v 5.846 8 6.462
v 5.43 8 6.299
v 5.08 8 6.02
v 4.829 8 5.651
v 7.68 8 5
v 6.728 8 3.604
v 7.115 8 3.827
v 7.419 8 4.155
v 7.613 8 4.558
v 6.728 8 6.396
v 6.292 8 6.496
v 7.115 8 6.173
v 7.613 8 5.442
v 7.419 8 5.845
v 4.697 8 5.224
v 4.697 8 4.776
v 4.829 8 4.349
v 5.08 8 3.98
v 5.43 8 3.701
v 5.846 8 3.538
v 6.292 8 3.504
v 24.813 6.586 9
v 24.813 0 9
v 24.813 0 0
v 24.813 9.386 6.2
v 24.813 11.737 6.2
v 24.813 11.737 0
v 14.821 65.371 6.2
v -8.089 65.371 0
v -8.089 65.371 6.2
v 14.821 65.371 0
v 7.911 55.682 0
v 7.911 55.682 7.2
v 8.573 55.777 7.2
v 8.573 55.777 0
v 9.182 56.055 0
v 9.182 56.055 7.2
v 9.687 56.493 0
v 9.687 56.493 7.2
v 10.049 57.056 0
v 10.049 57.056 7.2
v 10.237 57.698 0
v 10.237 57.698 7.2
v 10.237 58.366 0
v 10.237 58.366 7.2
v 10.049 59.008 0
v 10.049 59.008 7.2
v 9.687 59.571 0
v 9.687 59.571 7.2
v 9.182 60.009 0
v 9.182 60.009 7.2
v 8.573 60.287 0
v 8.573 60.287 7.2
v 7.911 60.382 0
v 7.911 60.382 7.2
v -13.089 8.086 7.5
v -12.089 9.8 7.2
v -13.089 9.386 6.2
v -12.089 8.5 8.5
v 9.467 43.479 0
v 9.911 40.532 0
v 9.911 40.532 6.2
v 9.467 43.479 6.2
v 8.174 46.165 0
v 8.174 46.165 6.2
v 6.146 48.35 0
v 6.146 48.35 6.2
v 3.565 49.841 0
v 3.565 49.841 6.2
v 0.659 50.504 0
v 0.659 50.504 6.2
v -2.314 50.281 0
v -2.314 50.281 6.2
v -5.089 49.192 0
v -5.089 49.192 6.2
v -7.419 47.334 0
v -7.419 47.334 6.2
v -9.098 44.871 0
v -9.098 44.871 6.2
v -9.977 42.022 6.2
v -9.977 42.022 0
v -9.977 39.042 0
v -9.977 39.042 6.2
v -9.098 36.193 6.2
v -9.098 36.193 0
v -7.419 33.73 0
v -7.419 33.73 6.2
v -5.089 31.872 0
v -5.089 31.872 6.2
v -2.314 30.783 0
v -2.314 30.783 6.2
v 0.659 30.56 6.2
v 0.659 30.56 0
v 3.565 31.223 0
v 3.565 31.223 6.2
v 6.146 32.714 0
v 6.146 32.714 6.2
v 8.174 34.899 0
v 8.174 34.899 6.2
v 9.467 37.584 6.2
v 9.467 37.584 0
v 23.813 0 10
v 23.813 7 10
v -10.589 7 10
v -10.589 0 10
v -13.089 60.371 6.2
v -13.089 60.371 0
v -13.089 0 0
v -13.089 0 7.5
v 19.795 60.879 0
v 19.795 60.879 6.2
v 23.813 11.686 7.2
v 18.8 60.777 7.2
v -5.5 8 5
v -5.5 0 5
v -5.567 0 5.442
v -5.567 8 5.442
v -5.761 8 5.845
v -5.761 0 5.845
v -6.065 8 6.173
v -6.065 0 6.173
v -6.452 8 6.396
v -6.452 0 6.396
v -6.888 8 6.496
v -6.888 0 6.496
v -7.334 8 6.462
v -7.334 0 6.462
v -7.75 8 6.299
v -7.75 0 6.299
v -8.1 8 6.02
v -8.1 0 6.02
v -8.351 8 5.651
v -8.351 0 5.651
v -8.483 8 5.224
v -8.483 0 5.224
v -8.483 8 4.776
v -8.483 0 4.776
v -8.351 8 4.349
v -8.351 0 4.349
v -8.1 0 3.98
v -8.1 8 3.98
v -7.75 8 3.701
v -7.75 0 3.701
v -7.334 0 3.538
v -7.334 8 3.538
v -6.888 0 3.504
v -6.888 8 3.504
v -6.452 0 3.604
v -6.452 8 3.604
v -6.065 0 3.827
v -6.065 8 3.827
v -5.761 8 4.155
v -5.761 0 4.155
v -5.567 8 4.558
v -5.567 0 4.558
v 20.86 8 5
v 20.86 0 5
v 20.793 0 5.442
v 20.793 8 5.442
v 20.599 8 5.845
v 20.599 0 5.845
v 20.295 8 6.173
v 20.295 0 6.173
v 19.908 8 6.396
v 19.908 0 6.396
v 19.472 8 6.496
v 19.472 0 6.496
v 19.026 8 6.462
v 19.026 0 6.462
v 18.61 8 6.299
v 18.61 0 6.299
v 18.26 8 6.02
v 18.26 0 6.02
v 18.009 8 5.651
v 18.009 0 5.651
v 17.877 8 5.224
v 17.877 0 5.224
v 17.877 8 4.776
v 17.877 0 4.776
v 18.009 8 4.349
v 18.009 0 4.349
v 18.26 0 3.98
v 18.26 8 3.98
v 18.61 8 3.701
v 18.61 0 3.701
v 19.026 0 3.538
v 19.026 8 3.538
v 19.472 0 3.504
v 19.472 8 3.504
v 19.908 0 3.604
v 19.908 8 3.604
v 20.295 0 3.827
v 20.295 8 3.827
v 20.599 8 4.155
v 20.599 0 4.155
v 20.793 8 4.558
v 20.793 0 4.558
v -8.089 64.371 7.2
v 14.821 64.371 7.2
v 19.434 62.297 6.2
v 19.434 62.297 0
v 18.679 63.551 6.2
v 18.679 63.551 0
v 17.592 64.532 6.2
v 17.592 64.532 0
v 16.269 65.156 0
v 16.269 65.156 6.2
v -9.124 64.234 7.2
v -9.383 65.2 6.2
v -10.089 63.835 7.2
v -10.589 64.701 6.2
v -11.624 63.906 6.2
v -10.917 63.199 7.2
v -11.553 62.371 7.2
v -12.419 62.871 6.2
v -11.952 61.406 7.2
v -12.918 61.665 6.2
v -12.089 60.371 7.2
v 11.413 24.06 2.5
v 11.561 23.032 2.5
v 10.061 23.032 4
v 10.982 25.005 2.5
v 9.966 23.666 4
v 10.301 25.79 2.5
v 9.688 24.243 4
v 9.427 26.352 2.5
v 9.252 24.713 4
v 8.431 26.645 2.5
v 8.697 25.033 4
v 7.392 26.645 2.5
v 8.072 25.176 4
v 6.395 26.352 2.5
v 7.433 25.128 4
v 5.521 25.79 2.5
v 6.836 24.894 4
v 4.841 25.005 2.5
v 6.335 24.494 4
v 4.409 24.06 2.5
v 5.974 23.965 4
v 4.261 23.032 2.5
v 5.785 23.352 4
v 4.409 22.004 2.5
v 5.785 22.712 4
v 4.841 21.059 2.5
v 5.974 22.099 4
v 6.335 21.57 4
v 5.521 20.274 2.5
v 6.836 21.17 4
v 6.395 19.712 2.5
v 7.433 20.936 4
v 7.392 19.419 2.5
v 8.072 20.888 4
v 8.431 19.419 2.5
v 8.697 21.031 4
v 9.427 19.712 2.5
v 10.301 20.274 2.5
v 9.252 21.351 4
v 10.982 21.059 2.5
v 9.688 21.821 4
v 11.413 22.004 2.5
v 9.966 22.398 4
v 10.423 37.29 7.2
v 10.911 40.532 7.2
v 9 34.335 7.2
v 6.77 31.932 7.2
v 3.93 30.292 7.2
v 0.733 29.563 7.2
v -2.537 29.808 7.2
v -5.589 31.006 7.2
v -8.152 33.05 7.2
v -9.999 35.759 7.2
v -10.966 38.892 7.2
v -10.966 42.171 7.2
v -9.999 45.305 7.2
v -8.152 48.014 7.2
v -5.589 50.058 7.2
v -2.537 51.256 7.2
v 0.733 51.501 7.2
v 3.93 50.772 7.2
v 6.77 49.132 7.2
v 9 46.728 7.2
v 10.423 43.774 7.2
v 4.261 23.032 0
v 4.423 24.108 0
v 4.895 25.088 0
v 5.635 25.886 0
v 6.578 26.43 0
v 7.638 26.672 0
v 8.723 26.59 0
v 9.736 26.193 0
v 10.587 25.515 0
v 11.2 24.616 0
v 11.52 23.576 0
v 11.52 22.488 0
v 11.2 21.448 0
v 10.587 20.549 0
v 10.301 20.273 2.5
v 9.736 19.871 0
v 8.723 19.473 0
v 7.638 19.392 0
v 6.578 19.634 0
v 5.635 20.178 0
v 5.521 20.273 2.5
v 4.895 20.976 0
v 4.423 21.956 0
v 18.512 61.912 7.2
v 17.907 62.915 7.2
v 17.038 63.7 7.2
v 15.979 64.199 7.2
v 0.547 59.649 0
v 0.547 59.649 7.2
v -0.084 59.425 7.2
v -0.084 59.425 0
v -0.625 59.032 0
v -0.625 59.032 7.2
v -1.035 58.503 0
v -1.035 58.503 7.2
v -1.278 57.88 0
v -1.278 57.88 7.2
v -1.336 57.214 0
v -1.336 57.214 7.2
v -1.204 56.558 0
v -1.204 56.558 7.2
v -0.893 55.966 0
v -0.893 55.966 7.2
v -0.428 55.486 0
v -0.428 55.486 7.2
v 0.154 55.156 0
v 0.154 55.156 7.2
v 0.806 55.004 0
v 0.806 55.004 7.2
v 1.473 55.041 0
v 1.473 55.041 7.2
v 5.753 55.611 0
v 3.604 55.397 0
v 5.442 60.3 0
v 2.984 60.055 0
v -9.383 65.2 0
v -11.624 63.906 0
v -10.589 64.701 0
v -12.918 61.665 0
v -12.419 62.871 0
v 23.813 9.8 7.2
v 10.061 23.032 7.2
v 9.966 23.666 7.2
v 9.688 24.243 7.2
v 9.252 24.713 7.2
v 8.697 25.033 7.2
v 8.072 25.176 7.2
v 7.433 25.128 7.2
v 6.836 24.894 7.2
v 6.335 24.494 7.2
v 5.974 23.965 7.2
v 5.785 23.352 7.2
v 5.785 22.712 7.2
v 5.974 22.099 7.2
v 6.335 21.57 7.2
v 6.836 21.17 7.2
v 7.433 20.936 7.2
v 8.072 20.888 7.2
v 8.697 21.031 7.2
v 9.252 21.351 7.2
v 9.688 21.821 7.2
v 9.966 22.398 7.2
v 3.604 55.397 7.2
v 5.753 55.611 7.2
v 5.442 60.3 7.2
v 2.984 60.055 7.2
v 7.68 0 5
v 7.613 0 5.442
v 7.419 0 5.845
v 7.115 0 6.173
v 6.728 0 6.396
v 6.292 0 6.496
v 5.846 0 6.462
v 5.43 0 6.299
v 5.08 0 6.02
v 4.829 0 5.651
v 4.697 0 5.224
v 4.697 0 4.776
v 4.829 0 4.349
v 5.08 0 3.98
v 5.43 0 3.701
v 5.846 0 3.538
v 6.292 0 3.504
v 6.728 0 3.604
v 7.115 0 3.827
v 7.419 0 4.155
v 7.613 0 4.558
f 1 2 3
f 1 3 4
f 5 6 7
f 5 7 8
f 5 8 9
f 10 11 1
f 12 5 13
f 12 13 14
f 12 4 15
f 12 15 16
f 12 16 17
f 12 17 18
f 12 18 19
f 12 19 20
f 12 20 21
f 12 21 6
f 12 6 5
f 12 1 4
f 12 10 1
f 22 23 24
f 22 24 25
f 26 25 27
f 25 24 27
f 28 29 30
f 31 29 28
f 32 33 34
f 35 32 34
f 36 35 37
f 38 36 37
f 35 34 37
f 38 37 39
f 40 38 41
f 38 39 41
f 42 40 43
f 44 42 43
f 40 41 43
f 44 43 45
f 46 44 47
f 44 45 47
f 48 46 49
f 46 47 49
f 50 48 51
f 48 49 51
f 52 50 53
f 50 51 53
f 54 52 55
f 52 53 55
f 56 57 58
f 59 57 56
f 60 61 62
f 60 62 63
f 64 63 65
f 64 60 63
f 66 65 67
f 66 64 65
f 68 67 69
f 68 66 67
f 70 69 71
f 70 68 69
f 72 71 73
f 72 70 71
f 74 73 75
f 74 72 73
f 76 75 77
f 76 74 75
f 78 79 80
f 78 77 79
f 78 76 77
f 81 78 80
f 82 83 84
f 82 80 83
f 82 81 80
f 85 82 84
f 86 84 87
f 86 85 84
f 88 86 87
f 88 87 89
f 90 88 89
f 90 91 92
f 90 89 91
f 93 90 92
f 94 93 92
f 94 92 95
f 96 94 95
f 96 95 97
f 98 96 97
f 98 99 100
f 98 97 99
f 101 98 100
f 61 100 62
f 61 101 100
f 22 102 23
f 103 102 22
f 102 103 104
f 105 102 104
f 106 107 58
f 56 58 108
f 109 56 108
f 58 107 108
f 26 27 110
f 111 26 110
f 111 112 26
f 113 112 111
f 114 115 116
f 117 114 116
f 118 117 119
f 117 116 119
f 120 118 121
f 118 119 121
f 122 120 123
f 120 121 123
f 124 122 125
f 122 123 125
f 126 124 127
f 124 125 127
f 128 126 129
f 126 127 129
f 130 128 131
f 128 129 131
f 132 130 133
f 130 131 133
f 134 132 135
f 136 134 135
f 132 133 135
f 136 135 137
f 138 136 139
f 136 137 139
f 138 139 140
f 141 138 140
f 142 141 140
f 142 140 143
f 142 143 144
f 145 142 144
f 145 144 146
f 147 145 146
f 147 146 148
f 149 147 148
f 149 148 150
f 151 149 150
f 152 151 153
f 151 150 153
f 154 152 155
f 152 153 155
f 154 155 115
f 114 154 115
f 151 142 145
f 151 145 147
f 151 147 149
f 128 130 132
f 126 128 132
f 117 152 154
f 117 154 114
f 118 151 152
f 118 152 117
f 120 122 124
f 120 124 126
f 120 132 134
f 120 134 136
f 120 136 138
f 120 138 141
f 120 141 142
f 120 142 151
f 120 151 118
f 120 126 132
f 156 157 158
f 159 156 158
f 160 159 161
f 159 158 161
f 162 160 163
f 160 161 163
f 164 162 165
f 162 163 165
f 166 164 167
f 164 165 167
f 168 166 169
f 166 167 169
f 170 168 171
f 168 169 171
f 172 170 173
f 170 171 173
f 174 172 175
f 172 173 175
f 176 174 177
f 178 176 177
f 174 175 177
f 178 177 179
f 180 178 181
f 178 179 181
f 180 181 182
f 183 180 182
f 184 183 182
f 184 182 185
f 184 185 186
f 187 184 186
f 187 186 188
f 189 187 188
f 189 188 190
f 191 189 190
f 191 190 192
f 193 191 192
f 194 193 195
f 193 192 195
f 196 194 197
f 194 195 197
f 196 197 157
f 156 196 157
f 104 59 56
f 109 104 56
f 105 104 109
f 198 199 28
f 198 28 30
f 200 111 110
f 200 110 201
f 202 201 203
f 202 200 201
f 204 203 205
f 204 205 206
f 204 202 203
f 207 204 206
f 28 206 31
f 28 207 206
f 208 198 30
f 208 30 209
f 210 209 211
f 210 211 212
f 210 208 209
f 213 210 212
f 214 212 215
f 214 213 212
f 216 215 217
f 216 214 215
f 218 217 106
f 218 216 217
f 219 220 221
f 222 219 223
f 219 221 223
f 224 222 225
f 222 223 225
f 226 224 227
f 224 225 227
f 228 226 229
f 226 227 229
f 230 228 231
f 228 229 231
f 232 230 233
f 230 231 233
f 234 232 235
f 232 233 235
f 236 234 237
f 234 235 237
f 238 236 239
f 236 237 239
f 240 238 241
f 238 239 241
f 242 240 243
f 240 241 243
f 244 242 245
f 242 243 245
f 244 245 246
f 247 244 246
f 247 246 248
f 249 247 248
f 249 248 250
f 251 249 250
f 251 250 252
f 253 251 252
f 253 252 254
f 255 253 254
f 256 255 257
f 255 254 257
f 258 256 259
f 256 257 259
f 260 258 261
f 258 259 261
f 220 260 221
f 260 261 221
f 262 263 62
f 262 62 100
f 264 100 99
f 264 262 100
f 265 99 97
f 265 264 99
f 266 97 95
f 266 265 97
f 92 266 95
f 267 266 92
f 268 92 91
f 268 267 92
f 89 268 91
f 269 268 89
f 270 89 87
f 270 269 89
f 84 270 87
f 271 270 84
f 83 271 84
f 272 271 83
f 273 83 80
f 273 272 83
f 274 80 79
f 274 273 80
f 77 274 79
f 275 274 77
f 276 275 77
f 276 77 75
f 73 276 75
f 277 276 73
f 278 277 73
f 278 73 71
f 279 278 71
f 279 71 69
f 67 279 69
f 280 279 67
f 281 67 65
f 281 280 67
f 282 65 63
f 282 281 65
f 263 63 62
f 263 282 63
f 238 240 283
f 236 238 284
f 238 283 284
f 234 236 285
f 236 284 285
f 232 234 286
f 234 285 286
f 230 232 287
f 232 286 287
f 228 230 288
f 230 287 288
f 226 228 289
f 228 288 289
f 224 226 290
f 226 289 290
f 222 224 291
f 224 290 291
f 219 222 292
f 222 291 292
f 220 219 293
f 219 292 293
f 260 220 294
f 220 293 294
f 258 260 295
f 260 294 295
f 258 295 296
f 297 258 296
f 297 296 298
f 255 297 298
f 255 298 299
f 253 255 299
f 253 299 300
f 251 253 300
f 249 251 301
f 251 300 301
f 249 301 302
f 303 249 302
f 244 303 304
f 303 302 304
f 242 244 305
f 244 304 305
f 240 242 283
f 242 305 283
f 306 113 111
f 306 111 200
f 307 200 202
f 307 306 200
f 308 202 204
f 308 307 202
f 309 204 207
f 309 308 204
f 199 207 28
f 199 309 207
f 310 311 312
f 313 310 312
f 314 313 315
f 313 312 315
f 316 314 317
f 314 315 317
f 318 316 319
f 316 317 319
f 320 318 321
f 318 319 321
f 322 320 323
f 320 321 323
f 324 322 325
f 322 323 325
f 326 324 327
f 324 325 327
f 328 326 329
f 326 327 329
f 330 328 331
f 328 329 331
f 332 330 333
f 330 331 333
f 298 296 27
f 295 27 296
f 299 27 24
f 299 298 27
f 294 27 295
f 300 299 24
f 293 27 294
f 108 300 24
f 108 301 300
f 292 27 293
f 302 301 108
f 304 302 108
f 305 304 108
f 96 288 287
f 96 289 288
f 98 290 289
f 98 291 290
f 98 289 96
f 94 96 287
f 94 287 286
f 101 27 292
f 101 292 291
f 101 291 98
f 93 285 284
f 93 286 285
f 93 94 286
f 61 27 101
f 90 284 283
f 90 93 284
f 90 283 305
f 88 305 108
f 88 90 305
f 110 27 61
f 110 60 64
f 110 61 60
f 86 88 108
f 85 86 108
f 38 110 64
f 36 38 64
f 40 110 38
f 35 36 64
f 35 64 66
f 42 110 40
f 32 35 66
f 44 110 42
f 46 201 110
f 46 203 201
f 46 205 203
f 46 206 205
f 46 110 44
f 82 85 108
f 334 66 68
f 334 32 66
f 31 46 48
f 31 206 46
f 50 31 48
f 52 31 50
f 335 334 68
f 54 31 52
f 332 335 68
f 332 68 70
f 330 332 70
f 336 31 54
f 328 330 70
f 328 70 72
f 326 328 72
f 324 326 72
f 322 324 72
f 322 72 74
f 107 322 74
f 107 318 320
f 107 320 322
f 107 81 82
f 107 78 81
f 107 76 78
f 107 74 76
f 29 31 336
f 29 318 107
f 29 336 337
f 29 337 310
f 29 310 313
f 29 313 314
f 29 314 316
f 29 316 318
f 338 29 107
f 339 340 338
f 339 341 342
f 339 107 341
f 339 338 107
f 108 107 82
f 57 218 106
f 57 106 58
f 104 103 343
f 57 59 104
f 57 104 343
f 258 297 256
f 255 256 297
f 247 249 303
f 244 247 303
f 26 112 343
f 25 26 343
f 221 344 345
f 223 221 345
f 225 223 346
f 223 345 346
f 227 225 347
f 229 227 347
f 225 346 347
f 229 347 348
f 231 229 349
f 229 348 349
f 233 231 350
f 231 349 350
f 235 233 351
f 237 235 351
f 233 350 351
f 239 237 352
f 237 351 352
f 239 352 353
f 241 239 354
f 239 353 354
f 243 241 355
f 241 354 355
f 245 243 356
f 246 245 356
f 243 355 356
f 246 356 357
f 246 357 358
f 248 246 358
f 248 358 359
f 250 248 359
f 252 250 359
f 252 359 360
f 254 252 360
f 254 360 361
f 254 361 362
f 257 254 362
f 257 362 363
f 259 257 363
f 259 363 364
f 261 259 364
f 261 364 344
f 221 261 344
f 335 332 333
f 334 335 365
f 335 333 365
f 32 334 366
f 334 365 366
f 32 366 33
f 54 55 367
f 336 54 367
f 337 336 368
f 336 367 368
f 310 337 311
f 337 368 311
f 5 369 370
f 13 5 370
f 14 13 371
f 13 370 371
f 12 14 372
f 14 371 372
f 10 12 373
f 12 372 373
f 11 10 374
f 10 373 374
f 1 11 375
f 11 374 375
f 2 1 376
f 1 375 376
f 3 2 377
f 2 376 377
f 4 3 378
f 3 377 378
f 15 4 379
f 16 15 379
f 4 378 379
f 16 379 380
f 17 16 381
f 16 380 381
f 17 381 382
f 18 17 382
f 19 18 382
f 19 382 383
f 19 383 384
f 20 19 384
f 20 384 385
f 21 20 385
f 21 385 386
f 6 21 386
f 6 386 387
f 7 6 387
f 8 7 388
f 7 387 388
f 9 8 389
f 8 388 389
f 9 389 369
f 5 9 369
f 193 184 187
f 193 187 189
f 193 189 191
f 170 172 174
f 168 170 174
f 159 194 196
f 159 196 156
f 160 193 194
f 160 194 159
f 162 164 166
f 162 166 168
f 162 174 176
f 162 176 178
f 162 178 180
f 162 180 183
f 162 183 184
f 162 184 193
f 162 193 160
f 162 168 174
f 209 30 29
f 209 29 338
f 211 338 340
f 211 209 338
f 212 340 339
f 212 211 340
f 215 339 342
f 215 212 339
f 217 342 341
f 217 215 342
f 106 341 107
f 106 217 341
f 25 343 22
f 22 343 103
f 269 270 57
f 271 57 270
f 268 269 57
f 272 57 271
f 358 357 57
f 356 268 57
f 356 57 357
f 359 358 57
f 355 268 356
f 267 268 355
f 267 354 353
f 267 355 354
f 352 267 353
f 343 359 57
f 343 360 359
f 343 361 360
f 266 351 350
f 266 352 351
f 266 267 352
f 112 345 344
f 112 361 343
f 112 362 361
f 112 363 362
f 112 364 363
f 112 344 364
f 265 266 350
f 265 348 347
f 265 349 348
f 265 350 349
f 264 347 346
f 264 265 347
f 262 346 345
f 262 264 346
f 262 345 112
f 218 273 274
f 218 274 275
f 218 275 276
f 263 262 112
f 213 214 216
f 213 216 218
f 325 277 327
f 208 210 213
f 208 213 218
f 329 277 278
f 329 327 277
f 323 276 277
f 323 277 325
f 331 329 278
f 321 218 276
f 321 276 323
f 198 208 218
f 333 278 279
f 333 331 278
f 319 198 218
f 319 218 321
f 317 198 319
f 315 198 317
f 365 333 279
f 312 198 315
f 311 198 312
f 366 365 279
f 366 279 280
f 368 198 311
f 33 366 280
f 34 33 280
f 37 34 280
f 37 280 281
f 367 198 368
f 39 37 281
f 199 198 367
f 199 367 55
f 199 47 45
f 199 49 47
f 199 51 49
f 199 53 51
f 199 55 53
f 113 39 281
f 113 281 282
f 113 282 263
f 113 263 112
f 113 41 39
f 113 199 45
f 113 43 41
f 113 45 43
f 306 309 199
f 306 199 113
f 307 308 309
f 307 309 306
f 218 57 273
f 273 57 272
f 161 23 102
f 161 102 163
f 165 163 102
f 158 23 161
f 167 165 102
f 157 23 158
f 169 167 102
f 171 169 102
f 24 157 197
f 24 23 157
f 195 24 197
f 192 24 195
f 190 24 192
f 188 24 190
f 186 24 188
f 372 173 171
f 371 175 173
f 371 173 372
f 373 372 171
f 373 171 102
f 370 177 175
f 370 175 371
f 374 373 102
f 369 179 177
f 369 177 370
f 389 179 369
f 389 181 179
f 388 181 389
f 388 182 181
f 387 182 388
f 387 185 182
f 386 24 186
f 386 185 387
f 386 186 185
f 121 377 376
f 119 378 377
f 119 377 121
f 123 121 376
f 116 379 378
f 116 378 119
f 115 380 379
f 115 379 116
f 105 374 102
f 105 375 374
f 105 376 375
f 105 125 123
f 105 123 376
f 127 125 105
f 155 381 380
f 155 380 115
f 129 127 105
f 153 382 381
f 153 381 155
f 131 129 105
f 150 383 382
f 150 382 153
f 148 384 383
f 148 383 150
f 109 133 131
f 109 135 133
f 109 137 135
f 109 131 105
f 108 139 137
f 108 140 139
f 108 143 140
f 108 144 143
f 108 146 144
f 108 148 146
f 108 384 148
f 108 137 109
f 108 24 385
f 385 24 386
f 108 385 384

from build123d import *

# Parameters (mm, degrees)
AUFSATZ_LINEAR_AUSTRAGEN1_DEPTH      = 10
SKIZZE2_R                            = 1.5
SCHNITT_LINEAR_AUSTRAGEN1_DEPTH      = 8
SCHNITT_LINEAR_AUSTRAGEN3_DEPTH      = 2.8
SCHNITT_LINEAR_AUSTRAGEN5_DEPTH      = 72.591285383
SCHNITT_LINEAR_AUSTRAGEN5_DEPTH_BACK = 72.591285383
SKIZZE7_R                            = 10
FASE1_SIZE                           = 3
SCHNITT_LINEAR_AUSTRAGEN4_DEPTH      = 10
VERRUNDUNG1_R                        = 5
FASE2_SIZE                           = 1
FASE3_SIZE                           = 2.5
SKIZZE9_R                            = 2.15
SCHNITT_LINEAR_AUSTRAGEN7_DEPTH      = 71.291034025
SKIZZE10_R                           = 3.65
SCHNITT_LINEAR_AUSTRAGEN8_DEPTH      = 2.5
FASE4_SIZE                           = 1.5
SCHNITT_LINEAR_AUSTRAGEN9_DEPTH      = 10


# Some blends are built 0.0001 mm under size
with BuildPart() as part:
    # Skizze1 → Aufsatz-Linear austragen1 (new body)
    with BuildSketch(Plane.XY):
        Polygon((28.287001282, 57.370618027), (28.287001282, 0), (-13.088781156, 0), (-13.088781156, 27.348243657), (-13.088781156, 53.715647777), (-13.088781156, 57.370618027), (-13.088781156, 65.370618027), (28.287001282, 65.370618027), align=None)
    extrude(amount=AUFSATZ_LINEAR_AUSTRAGEN1_DEPTH)

    # Skizze2 → Schnitt-Linear austragen1 (cut)
    with BuildSketch(Plane.XZ):
        with Locations((-7, 5)):
            Circle(SKIZZE2_R)
        with Locations((6.18, 5)):
            Circle(SKIZZE2_R)
        with Locations((19.36, 5)):
            Circle(SKIZZE2_R)
    extrude(amount=-SCHNITT_LINEAR_AUSTRAGEN1_DEPTH, mode=Mode.SUBTRACT)

    # Skizze4 → Schnitt-Linear austragen3 (cut)
    with BuildSketch(Plane.XY.offset(10)):
        Polygon((-15.095168359, 10), (28.287001282, 10), (36.093332102, 46.989971623), (30.429094825, 65.957451721), (-16.081030445, 65.957451721), (-16.081030445, 27.753515123), align=None)
    extrude(amount=-SCHNITT_LINEAR_AUSTRAGEN3_DEPTH, mode=Mode.SUBTRACT)

    # Skizze7 → Schnitt-Linear austragen5 (cut, two sides: drawn at the far end of the back side and taken through both)
    with BuildSketch(Plane.XY.offset(7.2).offset(-SCHNITT_LINEAR_AUSTRAGEN5_DEPTH_BACK)):
        with Locations((-0.088781156, 40.531945717)):
            Circle(SKIZZE7_R)
    extrude(amount=SCHNITT_LINEAR_AUSTRAGEN5_DEPTH + SCHNITT_LINEAR_AUSTRAGEN5_DEPTH_BACK, mode=Mode.SUBTRACT)

    # Fase1
    # the kernel refuses this chamfer: 3 mm, written as the material it takes off along each edge
    with BuildSketch(Plane(origin=(-20.80383012, 10, 10), x_dir=(0, -0.9996219169112969, 0.027495876610586202), z_dir=(1, 0, 0))) as fase1_piece_1_section:
        Polygon((FASE1_SIZE * 0.999621916911, FASE1_SIZE * 0.0274958766106), (-FASE1_SIZE * 0.0274958766106, FASE1_SIZE * 0.999621916911), (0, 0), align=None)
    fase1_piece_1 = extrude(amount=56.805880365, mode=Mode.PRIVATE)
    fase1_piece_1 = split(fase1_piece_1, bisect_by=Plane(origin=(7.599110063, 8.999392985, 7.2), z_dir=(0, 0, 1)), keep=Keep.TOP, mode=Mode.PRIVATE)
    add(fase1_piece_1, mode=Mode.SUBTRACT)

    # Skizze5 → Schnitt-Linear austragen4 (cut)
    with BuildSketch(Plane(origin=(0, 0, 0), x_dir=(-1, 0, 0), z_dir=(0, 0, -1))):
        Polygon((-24.81273389, 11.736777957), (-19.336036603, 65.370618027), (-28.287001282, 65.370618027), (-28.287001282, 0), (-24.81273389, 0), align=None)
    extrude(amount=-SCHNITT_LINEAR_AUSTRAGEN4_DEPTH, mode=Mode.SUBTRACT)

    # Verrundung1
    verrundung1_edges = [part.edges().sort_by_distance(p)[0] for p in [
        (-13.088781156, 65.370618027, 3.6),
        (19.336036603, 65.370618027, 3.6),
    ]]
    fillet(verrundung1_edges, radius=VERRUNDUNG1_R)

    # Fase2
    fase2_edges = [part.edges().sort_by_distance(p)[0] for p in [
        (-13.088781156, 35.085309014, 7.2),
        (3.365909563, 65.370618027, 7.2),
        (22.303734377, 36.307659198, 7.2),
        (18.17174844, 64.081386954, 7.2),
        (-11.624315062, 63.906151933, 7.2),
        (-10.088781156, 40.531945717, 7.2),
        (-13.088781156, 8.4, 8.6),
        (24.81273389, 8.4, 8.6),
        (24.81273389, 10.768388979, 7.2),
        (24.81273389, 3.5, 10),
    ]]
    chamfer(fase2_edges, length=FASE2_SIZE)

    # Fase3
    fase3_edges = [part.edges().sort_by_distance(p)[0] for p in [
        (-13.088781156, 2.792893219, 10),
    ]]
    chamfer(fase3_edges, length=FASE3_SIZE)

    # Skizze9 → Schnitt-Linear austragen7 (cut, through all)
    with BuildSketch(Plane.XY.offset(7.2)):
        with Locations((7.911218844, 58.031945717)):
            Circle(SKIZZE9_R)
        with Locations((7.911218844, 23.031945717)):
            Circle(SKIZZE9_R)
    extrude(amount=-SCHNITT_LINEAR_AUSTRAGEN7_DEPTH, mode=Mode.SUBTRACT)

    # Skizze10 → Schnitt-Linear austragen8 (cut)
    with BuildSketch(Plane(origin=(0, 0, 0), x_dir=(-1, 0, 0), z_dir=(0, 0, -1))):
        with Locations((-7.911218844, 23.031945717)):
            Circle(SKIZZE10_R)
    extrude(amount=-SCHNITT_LINEAR_AUSTRAGEN8_DEPTH, mode=Mode.SUBTRACT)

    # Fase4
    fase4_edges = [part.edges().sort_by_distance(p)[0] for p in [
        (5.761218844, 23.031945717, 2.5),
    ]]
    chamfer(fase4_edges, length=FASE4_SIZE - 0.0001)  # a hair under: the kernel refuses the full size

    # Skizze11 → Schnitt-Linear austragen9 (cut)
    with BuildSketch(Plane.XY.offset(7.2)):
        with BuildLine():
            ThreePointArc((7.911218844, 60.381945717), (4.210709496, 60.198176768), (0.546614537, 59.648678277))
            ThreePointArc((0.546614537, 59.648678277), (-1.293880815, 56.88144557), (1.473351893, 55.040950218))
            ThreePointArc((1.473351893, 55.040950218), (4.676369307, 55.521301643), (7.911218844, 55.681945717))
            ThreePointArc((7.911218844, 55.681945717), (10.261218844, 58.031945717), (7.911218844, 60.381945717))
        make_face()
    extrude(amount=-SCHNITT_LINEAR_AUSTRAGEN9_DEPTH, mode=Mode.SUBTRACT)


solid = part.part
